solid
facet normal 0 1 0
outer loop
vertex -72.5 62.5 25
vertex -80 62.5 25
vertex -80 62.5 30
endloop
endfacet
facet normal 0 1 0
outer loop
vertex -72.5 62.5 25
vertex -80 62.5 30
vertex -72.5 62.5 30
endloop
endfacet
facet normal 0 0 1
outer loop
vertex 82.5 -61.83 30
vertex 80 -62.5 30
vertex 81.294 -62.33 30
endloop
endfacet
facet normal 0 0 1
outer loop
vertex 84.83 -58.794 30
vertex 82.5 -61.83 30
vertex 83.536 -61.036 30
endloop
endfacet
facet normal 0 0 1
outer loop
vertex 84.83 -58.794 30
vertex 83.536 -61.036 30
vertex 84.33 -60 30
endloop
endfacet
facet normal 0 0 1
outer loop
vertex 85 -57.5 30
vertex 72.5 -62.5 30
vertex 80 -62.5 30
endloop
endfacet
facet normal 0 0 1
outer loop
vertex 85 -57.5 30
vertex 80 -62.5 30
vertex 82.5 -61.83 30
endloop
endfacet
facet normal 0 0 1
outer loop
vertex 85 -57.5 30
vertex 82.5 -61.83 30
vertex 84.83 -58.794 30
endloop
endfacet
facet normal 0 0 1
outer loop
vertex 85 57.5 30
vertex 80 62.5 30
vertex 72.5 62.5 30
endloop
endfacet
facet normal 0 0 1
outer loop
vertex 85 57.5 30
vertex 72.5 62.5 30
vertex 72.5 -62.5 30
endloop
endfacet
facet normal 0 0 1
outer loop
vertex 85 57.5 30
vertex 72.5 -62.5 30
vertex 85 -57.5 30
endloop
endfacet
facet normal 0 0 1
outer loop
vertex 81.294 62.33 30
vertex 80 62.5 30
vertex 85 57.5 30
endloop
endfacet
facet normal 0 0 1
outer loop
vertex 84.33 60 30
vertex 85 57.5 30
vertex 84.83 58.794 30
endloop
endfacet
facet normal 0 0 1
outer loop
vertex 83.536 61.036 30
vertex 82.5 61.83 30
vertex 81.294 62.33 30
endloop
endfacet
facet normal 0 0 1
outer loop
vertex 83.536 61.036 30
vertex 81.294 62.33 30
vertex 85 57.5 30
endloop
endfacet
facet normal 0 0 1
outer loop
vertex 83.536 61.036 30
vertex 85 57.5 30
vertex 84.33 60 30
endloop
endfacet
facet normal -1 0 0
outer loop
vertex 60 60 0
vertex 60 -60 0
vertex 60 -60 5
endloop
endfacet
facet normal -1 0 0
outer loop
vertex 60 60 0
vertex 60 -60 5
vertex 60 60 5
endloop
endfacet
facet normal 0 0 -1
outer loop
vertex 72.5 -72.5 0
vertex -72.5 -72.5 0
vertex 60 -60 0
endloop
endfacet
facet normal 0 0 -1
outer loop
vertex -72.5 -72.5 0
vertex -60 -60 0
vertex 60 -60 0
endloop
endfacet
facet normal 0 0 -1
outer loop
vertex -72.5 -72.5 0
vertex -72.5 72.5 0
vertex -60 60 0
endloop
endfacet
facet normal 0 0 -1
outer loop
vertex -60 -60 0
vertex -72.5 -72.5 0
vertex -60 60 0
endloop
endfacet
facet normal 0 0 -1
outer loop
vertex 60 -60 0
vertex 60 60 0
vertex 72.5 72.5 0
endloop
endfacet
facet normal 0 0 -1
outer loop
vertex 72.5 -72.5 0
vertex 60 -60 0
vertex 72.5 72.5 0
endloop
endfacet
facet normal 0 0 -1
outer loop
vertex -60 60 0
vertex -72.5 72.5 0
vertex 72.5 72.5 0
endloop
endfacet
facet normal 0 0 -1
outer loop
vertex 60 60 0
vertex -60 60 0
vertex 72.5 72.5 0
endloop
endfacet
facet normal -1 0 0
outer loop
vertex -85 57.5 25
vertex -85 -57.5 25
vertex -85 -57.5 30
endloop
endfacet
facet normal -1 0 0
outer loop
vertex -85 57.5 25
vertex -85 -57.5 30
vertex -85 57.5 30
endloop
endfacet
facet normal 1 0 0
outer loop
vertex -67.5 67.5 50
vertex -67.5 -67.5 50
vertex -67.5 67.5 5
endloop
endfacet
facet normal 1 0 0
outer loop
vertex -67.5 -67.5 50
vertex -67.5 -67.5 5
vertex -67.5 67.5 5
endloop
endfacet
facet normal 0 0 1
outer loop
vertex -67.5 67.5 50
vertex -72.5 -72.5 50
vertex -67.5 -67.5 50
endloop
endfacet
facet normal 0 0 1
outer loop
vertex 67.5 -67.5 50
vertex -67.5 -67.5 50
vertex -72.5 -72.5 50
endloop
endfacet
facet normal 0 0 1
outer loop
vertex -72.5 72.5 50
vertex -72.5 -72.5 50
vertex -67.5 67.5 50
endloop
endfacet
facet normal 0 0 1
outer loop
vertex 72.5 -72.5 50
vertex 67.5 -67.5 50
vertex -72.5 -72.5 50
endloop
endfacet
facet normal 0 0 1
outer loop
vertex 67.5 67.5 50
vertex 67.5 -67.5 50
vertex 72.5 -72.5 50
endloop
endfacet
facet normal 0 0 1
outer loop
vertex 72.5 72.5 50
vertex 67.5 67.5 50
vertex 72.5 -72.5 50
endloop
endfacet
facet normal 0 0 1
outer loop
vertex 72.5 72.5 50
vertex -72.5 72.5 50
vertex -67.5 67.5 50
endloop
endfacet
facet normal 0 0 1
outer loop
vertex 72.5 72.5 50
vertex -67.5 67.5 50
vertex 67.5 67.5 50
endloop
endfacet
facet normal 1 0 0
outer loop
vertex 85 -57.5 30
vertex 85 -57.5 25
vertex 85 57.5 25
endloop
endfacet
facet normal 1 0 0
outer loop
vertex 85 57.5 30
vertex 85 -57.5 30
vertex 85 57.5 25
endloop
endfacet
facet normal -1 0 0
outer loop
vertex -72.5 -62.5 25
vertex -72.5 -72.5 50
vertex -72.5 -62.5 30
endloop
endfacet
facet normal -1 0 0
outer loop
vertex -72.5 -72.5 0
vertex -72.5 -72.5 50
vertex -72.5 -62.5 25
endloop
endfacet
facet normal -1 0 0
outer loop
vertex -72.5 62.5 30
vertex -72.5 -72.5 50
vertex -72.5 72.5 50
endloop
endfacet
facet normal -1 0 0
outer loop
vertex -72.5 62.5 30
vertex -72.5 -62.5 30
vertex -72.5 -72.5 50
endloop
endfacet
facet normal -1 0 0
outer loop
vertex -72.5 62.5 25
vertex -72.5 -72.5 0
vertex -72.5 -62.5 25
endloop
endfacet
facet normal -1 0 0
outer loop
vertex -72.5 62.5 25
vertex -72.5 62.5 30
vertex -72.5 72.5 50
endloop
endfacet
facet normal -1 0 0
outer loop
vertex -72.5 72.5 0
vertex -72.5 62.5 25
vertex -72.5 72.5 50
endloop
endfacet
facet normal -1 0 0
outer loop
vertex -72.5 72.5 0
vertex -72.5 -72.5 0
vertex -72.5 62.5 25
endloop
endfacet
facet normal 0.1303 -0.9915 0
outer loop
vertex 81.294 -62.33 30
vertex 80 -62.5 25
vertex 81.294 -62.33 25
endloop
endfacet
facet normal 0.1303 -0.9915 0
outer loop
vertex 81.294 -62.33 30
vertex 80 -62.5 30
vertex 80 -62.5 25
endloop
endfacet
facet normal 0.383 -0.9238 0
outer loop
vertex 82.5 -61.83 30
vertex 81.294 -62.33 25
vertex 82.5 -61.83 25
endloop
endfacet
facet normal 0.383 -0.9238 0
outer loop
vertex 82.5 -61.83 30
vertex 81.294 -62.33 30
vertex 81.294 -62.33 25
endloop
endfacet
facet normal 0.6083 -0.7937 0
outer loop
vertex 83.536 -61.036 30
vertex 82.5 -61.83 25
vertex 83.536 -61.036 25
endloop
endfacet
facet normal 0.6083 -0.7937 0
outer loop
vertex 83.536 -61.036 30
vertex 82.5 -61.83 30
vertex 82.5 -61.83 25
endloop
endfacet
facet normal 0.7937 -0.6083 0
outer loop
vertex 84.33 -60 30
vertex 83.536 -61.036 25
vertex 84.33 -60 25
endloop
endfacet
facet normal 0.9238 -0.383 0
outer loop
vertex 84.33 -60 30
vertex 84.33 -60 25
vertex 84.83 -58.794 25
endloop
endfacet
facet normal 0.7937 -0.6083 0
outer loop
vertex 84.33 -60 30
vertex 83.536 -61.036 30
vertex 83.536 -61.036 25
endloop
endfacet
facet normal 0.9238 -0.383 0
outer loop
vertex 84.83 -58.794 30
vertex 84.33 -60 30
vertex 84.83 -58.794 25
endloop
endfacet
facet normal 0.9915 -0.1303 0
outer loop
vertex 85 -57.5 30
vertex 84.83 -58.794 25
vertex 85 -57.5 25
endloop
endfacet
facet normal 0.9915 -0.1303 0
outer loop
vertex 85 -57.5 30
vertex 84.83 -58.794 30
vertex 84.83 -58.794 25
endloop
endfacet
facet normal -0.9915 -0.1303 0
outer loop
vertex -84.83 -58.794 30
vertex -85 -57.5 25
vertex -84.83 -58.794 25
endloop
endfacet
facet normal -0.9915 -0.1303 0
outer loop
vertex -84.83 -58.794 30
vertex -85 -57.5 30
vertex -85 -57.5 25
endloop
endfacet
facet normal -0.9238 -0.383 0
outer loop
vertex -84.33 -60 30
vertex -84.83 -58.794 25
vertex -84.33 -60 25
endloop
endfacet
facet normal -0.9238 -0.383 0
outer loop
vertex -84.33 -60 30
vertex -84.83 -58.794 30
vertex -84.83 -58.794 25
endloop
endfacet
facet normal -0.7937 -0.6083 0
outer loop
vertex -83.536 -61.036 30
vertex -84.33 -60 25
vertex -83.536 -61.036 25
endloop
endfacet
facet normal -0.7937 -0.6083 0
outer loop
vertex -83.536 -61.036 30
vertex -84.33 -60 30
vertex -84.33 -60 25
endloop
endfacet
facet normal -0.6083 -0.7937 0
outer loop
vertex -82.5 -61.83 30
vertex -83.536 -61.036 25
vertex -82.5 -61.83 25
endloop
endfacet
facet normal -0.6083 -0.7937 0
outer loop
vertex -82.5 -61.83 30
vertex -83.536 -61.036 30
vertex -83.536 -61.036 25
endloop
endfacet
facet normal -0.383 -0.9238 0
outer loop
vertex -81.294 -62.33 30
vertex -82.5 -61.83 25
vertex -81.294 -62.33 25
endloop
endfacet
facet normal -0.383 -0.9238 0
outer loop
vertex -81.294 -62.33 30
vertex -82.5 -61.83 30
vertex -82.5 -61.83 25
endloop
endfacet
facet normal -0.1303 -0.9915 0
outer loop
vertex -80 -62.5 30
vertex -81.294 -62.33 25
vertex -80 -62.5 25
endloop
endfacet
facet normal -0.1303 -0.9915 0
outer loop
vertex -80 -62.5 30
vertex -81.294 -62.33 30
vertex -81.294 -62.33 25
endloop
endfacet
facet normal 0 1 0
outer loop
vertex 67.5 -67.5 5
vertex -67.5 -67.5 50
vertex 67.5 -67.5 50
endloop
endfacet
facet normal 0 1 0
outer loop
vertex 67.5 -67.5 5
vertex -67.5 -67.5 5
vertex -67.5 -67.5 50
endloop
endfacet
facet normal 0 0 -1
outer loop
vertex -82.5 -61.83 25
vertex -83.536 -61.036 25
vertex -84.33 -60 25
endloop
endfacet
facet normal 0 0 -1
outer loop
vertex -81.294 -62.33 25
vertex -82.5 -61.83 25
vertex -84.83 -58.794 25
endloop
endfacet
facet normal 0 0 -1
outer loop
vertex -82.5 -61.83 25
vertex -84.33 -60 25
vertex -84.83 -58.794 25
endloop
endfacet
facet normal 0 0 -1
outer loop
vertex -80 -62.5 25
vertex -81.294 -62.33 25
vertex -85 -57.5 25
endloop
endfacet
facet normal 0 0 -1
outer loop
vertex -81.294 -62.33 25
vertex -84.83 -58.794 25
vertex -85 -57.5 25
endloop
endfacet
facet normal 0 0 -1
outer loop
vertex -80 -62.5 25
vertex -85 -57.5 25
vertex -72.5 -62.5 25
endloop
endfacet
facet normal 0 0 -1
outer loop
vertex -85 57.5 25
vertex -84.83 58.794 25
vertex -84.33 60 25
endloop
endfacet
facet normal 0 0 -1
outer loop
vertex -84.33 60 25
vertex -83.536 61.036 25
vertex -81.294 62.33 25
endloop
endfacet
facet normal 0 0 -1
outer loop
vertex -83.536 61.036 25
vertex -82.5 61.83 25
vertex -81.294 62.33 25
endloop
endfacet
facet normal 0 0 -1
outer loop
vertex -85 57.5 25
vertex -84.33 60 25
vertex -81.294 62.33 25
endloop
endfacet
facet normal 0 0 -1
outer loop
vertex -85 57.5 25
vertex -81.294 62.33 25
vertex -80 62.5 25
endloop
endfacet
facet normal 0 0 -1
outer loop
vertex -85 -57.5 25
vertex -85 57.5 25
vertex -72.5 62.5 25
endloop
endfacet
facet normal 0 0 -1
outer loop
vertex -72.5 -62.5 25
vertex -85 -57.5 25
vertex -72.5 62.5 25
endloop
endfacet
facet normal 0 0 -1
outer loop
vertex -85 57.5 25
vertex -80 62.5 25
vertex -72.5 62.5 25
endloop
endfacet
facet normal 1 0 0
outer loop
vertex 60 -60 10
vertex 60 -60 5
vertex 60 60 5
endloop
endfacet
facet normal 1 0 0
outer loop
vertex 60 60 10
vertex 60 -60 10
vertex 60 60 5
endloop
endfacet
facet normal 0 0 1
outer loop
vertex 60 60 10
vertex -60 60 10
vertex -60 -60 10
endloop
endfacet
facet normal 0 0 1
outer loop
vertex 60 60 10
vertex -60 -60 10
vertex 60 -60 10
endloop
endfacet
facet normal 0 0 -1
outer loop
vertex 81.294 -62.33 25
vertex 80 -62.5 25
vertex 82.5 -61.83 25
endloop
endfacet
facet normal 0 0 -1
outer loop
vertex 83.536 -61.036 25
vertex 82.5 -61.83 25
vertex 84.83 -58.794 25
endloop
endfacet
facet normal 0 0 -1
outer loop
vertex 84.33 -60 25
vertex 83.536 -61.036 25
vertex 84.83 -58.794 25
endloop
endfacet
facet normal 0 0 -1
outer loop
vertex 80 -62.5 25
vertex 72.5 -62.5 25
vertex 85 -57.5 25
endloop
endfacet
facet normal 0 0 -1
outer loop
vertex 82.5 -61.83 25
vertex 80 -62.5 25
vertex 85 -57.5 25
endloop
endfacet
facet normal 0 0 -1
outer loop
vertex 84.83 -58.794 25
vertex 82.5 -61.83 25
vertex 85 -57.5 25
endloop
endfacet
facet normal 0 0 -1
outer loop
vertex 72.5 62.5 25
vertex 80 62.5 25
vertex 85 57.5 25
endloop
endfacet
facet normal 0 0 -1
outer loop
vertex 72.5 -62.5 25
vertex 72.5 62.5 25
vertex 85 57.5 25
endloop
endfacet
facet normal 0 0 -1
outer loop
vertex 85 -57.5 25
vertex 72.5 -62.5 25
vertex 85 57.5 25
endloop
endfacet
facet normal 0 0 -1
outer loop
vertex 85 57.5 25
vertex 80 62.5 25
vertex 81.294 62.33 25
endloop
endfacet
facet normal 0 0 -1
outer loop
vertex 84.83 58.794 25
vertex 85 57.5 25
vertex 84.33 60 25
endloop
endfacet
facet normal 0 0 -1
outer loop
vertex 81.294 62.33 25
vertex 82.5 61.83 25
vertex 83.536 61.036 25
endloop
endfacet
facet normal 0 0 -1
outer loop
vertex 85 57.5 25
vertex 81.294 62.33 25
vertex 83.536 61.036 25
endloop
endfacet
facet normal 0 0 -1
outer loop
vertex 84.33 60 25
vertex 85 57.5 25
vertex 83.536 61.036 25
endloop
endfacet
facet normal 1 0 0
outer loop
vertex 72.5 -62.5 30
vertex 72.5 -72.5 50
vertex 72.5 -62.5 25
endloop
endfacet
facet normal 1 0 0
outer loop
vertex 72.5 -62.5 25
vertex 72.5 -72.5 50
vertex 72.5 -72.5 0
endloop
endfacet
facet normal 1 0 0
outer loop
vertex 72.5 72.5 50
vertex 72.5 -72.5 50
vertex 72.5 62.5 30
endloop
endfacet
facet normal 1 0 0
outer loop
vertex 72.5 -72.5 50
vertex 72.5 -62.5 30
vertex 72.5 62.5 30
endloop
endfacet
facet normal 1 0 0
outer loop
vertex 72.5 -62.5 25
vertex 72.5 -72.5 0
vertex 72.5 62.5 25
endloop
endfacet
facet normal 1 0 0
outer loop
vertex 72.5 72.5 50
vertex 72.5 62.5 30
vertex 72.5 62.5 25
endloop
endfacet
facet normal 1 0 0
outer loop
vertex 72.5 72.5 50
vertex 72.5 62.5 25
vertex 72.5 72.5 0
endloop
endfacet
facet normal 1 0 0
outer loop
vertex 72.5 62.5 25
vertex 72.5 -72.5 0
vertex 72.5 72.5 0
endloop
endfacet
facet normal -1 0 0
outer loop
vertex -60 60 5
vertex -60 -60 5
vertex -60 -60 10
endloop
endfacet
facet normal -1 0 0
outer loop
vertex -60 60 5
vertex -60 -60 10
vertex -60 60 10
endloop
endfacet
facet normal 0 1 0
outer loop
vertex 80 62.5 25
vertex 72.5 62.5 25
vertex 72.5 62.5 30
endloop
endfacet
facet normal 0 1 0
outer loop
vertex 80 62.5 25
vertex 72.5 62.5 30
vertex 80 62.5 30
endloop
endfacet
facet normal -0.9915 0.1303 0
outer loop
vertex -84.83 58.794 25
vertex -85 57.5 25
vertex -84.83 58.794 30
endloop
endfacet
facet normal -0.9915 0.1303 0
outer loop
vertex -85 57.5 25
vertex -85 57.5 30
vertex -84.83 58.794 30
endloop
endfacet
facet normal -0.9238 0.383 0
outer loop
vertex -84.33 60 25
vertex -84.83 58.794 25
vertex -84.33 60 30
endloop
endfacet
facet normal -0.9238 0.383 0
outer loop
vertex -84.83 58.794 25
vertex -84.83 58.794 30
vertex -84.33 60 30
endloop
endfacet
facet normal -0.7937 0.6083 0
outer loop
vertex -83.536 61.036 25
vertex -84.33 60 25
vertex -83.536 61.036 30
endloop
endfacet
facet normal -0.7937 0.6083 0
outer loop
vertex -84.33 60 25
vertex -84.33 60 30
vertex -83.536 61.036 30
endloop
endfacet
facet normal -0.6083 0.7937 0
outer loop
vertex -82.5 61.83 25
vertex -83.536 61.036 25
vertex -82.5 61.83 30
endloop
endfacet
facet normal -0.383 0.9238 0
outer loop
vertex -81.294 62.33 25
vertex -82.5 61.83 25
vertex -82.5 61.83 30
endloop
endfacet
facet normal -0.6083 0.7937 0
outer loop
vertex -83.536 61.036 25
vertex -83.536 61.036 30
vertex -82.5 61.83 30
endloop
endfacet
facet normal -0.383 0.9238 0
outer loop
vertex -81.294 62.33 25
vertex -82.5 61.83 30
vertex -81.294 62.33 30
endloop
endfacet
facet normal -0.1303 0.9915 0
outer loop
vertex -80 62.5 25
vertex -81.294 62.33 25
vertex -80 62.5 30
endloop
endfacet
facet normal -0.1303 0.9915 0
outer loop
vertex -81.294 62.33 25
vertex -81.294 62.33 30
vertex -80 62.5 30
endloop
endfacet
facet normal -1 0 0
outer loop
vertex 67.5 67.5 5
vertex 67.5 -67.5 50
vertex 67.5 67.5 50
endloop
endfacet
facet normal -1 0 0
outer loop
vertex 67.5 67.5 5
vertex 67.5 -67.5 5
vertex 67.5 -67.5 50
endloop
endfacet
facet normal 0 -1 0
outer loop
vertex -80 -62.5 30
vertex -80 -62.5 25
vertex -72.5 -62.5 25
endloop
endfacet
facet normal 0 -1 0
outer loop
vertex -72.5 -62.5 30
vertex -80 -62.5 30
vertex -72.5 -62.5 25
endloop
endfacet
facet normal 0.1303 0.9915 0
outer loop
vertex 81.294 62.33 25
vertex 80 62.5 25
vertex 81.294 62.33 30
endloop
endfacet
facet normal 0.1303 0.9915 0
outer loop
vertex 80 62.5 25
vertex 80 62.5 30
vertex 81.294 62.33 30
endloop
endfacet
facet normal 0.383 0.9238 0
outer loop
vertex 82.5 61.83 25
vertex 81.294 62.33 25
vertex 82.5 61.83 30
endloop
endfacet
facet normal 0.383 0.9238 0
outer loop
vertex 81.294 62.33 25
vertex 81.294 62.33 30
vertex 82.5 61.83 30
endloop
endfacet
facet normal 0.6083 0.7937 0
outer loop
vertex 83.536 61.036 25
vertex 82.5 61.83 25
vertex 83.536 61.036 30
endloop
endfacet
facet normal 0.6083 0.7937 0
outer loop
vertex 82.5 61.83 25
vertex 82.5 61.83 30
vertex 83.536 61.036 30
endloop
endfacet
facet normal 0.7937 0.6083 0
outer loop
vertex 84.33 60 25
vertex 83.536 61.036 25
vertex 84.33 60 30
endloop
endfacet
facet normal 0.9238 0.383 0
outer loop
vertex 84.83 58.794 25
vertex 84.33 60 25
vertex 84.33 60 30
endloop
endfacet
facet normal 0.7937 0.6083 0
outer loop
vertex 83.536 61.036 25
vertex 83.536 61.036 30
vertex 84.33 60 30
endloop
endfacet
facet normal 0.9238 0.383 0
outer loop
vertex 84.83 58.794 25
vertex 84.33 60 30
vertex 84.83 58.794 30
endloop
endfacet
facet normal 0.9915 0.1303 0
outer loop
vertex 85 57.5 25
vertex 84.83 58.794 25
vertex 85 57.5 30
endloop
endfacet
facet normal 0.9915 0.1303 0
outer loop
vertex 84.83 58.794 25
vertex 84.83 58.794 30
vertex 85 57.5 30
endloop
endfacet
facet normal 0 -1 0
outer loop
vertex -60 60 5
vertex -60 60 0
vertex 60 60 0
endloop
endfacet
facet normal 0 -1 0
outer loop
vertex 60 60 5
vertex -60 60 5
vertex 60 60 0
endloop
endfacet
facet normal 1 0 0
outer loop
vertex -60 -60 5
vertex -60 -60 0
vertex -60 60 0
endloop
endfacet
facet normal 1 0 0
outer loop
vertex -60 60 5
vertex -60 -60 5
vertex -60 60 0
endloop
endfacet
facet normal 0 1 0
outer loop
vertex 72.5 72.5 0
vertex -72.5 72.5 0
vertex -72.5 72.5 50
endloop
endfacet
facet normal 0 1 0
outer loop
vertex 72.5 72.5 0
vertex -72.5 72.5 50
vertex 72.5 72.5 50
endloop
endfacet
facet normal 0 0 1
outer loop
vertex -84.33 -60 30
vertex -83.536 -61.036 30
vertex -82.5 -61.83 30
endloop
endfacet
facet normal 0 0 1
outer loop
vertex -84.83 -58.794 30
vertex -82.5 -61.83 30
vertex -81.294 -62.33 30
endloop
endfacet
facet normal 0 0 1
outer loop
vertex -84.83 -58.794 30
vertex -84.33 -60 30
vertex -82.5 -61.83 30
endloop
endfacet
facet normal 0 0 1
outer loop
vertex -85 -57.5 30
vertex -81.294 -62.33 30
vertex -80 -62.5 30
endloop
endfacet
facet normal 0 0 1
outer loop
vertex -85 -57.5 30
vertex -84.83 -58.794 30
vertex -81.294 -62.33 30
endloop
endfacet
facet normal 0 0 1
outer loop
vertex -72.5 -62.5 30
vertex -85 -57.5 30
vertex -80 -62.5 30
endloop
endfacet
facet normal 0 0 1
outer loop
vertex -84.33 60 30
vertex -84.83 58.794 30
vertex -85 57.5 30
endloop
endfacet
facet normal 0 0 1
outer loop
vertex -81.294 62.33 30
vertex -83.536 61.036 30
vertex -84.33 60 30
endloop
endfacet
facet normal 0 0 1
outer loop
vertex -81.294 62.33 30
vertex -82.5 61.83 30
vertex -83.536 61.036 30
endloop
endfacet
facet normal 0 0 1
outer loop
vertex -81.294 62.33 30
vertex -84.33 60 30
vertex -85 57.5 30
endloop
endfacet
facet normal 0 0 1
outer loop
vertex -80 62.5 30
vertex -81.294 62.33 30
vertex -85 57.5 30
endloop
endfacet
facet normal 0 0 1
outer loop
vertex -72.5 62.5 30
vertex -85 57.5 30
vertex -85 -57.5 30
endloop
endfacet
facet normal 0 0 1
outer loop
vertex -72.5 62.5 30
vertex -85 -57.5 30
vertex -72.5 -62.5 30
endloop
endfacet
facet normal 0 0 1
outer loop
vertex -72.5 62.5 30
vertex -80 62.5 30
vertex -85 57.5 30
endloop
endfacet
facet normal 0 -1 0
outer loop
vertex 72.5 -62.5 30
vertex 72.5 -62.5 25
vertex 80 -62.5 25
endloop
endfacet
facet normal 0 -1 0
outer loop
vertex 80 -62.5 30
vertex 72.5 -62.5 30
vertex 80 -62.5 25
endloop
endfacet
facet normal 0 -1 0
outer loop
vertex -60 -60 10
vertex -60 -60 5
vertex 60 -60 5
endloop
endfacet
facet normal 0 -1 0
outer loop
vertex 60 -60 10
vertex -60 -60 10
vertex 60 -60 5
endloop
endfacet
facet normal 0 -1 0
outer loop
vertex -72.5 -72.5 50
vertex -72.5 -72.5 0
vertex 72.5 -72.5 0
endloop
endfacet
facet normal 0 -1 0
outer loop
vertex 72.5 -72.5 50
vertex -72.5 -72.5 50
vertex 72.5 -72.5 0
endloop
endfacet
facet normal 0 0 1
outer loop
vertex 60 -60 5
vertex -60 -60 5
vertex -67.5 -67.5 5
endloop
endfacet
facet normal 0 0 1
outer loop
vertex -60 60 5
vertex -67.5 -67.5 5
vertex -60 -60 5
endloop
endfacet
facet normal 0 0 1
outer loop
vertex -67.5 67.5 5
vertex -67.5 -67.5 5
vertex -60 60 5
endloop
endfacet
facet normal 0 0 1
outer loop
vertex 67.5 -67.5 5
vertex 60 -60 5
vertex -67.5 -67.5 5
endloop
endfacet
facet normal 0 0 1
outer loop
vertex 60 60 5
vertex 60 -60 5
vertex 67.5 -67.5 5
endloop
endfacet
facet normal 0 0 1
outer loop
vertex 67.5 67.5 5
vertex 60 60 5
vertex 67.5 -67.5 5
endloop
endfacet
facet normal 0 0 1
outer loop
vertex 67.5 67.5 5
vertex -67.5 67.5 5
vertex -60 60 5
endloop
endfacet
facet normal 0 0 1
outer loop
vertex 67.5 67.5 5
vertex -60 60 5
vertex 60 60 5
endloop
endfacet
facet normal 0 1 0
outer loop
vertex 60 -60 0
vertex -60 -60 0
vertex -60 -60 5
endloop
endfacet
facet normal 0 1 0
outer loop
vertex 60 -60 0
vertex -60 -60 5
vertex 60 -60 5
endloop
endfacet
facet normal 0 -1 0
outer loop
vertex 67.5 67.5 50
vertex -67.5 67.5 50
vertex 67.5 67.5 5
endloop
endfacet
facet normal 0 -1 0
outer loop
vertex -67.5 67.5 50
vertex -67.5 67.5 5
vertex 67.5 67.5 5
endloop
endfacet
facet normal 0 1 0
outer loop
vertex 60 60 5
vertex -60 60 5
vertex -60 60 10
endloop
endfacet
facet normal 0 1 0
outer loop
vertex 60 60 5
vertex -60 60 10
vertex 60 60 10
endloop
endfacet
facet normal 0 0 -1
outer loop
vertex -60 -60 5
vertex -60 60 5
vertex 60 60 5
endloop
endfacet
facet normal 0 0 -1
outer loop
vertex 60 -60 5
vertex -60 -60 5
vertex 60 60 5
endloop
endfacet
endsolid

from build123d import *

# Parameters (mm, degrees)
F0_W      = 145
F0_H      = 145
F1_DEPTH  = 50
F2_T      = -5
F3_W      = 120
F3_H      = 120
F4_DEPTH  = 25
F6_W      = 15
F6_H      = 125
F7_DEPTH  = 5
F8_R      = 5
F9_W      = 120
F9_H      = 120
F10_DEPTH = 5


with BuildPart() as f1:
    # F0 (on Top) → F1 (new body)
    with BuildSketch(Plane.XY):
        Rectangle(F0_W, F0_H)
    extrude(amount=F1_DEPTH)

    # F2
    f2_openings = [f1.faces().sort_by_distance(p)[0] for p in [
        (0, 0, 50),
    ]]
    offset(amount=F2_T, openings=f2_openings)

    # F3 (on Top) → F4 (cut)
    with BuildSketch(Plane.XY):
        Rectangle(F3_W, F3_H)
    extrude(amount=F4_DEPTH, mode=Mode.SUBTRACT)

    # F6 (on offset) → F7 (join)
    with BuildSketch(Plane.XY.offset(25)):
        with Locations((-77.5, 0)):
            Rectangle(F6_W, F6_H)
        with Locations((77.5, 0)):
            Rectangle(F6_W, F6_H)
    extrude(amount=F7_DEPTH)

    # F8
    f8_edges = [f1.edges().sort_by_distance(p)[0] for p in [
        (-85, 62.5, 27.5),
        (85, 62.5, 27.5),
        (85, -62.5, 27.5),
        (-85, -62.5, 27.5),
    ]]
    fillet(f8_edges, radius=F8_R)


with BuildPart() as f10:
    # F9 (on face) → F10 (new body)
    with BuildSketch(Plane.XY.offset(5)):
        Rectangle(F9_W, F9_H)
    extrude(amount=F10_DEPTH)


solid = Compound([f1.part, f10.part])
